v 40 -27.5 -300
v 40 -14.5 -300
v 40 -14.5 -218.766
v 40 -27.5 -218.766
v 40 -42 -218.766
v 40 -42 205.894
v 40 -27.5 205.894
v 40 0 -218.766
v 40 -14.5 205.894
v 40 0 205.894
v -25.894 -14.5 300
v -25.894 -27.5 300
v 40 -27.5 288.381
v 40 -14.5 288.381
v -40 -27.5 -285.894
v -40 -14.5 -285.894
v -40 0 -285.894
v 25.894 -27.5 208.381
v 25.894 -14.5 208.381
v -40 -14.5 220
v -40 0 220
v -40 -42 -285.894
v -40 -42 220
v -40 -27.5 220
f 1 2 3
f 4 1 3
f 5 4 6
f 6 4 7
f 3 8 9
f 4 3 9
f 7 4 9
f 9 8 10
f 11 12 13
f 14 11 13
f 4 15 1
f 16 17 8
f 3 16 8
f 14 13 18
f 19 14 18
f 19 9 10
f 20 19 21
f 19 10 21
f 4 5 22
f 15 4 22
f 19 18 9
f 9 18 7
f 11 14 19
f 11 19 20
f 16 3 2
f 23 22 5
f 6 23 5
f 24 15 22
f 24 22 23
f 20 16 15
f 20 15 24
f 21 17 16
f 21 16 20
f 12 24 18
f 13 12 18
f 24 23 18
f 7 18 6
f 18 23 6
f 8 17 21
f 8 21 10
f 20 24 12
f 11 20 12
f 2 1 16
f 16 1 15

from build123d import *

# Parameters (mm, degrees)
F0_W      = 80
F0_H      = 600
F1_DEPTH  = 42
F2_W      = 80
F2_H      = 80
F3_DEPTH  = 14.5
F4_W      = 80
F4_H      = 80
F5_DEPTH  = 14.5
F7_DEPTH  = 14.5
F9_DEPTH  = 14.5
F11_DEPTH = 27.501
F13_DEPTH = 42.001
F15_DEPTH = 14.5
F17_DEPTH = 14.5


with BuildPart() as f1:
    # F0 (on Front) → F1 (new body)
    with BuildSketch(Plane.XZ):
        Rectangle(F0_W, F0_H)
    extrude(amount=F1_DEPTH)

    # F2 (on face) → F3 (cut)
    with BuildSketch(Plane.XZ.offset(42)):
        with Locations((0, 260)):
            Rectangle(F2_W, F2_H)
    extrude(amount=-F3_DEPTH, mode=Mode.SUBTRACT)

    # F4 (on face) → F5 (cut)
    with BuildSketch(Plane(origin=(0, 0, 0), x_dir=(-1, 0, 0), z_dir=(0, 1, 0))):
        with Locations((0, 260)):
            Rectangle(F4_W, F4_H)
    extrude(amount=-F5_DEPTH, mode=Mode.SUBTRACT)

    # F6 (on face) → F7 (cut, through all)
    with BuildSketch(Plane.XZ.offset(42)):
        Polygon((40, 220), (-40, 220), (40, 205.8938415433), align=None)
    extrude(amount=-F7_DEPTH, mode=Mode.SUBTRACT)

    # F8 (on face) → F9 (cut, through all)
    with BuildSketch(Plane(origin=(0, 0, 0), x_dir=(-1, 0, 0), z_dir=(0, 1, 0))):
        Polygon((-40, 205.8938415433), (40, 220), (-40, 220), align=None)
    extrude(amount=-F9_DEPTH, mode=Mode.SUBTRACT)

    # F10 (on face) → F11 (cut, through all)
    with BuildSketch(Plane.XZ.offset(27.5)):
        Polygon((-40, 300), (-40, 220), (-25.8938415433, 300), align=None)
        Polygon((40, 300), (-25.8938415433, 300), (40, 288.3811378734), align=None)
        Polygon((40, 288.3811378734), (25.8938415433, 208.3811378734), (40, 205.8938415433), align=None)
    extrude(amount=-F11_DEPTH, mode=Mode.SUBTRACT)

    # F12 (on face) → F13 (cut, through all)
    with BuildSketch(Plane.XZ.offset(42)):
        Polygon((-40, -300), (40, -300), (-40, -285.8938415433), align=None)
    extrude(amount=-F13_DEPTH, mode=Mode.SUBTRACT)

    # F14 (on face) → F15 (cut)
    with BuildSketch(Plane.XZ.offset(42)):
        Polygon((-40, -285.8938415433), (40, -300), (40, -218.7658710491), align=None)
    extrude(amount=-F15_DEPTH, mode=Mode.SUBTRACT)

    # F16 (on face) → F17 (cut)
    with BuildSketch(Plane(origin=(0, 0, 0), x_dir=(-1, 0, 0), z_dir=(0, 1, 0))):
        Polygon((-40, -218.7658710491), (-40, -300), (40, -285.8938415433), align=None)
    extrude(amount=-F17_DEPTH, mode=Mode.SUBTRACT)


solid = f1.part
